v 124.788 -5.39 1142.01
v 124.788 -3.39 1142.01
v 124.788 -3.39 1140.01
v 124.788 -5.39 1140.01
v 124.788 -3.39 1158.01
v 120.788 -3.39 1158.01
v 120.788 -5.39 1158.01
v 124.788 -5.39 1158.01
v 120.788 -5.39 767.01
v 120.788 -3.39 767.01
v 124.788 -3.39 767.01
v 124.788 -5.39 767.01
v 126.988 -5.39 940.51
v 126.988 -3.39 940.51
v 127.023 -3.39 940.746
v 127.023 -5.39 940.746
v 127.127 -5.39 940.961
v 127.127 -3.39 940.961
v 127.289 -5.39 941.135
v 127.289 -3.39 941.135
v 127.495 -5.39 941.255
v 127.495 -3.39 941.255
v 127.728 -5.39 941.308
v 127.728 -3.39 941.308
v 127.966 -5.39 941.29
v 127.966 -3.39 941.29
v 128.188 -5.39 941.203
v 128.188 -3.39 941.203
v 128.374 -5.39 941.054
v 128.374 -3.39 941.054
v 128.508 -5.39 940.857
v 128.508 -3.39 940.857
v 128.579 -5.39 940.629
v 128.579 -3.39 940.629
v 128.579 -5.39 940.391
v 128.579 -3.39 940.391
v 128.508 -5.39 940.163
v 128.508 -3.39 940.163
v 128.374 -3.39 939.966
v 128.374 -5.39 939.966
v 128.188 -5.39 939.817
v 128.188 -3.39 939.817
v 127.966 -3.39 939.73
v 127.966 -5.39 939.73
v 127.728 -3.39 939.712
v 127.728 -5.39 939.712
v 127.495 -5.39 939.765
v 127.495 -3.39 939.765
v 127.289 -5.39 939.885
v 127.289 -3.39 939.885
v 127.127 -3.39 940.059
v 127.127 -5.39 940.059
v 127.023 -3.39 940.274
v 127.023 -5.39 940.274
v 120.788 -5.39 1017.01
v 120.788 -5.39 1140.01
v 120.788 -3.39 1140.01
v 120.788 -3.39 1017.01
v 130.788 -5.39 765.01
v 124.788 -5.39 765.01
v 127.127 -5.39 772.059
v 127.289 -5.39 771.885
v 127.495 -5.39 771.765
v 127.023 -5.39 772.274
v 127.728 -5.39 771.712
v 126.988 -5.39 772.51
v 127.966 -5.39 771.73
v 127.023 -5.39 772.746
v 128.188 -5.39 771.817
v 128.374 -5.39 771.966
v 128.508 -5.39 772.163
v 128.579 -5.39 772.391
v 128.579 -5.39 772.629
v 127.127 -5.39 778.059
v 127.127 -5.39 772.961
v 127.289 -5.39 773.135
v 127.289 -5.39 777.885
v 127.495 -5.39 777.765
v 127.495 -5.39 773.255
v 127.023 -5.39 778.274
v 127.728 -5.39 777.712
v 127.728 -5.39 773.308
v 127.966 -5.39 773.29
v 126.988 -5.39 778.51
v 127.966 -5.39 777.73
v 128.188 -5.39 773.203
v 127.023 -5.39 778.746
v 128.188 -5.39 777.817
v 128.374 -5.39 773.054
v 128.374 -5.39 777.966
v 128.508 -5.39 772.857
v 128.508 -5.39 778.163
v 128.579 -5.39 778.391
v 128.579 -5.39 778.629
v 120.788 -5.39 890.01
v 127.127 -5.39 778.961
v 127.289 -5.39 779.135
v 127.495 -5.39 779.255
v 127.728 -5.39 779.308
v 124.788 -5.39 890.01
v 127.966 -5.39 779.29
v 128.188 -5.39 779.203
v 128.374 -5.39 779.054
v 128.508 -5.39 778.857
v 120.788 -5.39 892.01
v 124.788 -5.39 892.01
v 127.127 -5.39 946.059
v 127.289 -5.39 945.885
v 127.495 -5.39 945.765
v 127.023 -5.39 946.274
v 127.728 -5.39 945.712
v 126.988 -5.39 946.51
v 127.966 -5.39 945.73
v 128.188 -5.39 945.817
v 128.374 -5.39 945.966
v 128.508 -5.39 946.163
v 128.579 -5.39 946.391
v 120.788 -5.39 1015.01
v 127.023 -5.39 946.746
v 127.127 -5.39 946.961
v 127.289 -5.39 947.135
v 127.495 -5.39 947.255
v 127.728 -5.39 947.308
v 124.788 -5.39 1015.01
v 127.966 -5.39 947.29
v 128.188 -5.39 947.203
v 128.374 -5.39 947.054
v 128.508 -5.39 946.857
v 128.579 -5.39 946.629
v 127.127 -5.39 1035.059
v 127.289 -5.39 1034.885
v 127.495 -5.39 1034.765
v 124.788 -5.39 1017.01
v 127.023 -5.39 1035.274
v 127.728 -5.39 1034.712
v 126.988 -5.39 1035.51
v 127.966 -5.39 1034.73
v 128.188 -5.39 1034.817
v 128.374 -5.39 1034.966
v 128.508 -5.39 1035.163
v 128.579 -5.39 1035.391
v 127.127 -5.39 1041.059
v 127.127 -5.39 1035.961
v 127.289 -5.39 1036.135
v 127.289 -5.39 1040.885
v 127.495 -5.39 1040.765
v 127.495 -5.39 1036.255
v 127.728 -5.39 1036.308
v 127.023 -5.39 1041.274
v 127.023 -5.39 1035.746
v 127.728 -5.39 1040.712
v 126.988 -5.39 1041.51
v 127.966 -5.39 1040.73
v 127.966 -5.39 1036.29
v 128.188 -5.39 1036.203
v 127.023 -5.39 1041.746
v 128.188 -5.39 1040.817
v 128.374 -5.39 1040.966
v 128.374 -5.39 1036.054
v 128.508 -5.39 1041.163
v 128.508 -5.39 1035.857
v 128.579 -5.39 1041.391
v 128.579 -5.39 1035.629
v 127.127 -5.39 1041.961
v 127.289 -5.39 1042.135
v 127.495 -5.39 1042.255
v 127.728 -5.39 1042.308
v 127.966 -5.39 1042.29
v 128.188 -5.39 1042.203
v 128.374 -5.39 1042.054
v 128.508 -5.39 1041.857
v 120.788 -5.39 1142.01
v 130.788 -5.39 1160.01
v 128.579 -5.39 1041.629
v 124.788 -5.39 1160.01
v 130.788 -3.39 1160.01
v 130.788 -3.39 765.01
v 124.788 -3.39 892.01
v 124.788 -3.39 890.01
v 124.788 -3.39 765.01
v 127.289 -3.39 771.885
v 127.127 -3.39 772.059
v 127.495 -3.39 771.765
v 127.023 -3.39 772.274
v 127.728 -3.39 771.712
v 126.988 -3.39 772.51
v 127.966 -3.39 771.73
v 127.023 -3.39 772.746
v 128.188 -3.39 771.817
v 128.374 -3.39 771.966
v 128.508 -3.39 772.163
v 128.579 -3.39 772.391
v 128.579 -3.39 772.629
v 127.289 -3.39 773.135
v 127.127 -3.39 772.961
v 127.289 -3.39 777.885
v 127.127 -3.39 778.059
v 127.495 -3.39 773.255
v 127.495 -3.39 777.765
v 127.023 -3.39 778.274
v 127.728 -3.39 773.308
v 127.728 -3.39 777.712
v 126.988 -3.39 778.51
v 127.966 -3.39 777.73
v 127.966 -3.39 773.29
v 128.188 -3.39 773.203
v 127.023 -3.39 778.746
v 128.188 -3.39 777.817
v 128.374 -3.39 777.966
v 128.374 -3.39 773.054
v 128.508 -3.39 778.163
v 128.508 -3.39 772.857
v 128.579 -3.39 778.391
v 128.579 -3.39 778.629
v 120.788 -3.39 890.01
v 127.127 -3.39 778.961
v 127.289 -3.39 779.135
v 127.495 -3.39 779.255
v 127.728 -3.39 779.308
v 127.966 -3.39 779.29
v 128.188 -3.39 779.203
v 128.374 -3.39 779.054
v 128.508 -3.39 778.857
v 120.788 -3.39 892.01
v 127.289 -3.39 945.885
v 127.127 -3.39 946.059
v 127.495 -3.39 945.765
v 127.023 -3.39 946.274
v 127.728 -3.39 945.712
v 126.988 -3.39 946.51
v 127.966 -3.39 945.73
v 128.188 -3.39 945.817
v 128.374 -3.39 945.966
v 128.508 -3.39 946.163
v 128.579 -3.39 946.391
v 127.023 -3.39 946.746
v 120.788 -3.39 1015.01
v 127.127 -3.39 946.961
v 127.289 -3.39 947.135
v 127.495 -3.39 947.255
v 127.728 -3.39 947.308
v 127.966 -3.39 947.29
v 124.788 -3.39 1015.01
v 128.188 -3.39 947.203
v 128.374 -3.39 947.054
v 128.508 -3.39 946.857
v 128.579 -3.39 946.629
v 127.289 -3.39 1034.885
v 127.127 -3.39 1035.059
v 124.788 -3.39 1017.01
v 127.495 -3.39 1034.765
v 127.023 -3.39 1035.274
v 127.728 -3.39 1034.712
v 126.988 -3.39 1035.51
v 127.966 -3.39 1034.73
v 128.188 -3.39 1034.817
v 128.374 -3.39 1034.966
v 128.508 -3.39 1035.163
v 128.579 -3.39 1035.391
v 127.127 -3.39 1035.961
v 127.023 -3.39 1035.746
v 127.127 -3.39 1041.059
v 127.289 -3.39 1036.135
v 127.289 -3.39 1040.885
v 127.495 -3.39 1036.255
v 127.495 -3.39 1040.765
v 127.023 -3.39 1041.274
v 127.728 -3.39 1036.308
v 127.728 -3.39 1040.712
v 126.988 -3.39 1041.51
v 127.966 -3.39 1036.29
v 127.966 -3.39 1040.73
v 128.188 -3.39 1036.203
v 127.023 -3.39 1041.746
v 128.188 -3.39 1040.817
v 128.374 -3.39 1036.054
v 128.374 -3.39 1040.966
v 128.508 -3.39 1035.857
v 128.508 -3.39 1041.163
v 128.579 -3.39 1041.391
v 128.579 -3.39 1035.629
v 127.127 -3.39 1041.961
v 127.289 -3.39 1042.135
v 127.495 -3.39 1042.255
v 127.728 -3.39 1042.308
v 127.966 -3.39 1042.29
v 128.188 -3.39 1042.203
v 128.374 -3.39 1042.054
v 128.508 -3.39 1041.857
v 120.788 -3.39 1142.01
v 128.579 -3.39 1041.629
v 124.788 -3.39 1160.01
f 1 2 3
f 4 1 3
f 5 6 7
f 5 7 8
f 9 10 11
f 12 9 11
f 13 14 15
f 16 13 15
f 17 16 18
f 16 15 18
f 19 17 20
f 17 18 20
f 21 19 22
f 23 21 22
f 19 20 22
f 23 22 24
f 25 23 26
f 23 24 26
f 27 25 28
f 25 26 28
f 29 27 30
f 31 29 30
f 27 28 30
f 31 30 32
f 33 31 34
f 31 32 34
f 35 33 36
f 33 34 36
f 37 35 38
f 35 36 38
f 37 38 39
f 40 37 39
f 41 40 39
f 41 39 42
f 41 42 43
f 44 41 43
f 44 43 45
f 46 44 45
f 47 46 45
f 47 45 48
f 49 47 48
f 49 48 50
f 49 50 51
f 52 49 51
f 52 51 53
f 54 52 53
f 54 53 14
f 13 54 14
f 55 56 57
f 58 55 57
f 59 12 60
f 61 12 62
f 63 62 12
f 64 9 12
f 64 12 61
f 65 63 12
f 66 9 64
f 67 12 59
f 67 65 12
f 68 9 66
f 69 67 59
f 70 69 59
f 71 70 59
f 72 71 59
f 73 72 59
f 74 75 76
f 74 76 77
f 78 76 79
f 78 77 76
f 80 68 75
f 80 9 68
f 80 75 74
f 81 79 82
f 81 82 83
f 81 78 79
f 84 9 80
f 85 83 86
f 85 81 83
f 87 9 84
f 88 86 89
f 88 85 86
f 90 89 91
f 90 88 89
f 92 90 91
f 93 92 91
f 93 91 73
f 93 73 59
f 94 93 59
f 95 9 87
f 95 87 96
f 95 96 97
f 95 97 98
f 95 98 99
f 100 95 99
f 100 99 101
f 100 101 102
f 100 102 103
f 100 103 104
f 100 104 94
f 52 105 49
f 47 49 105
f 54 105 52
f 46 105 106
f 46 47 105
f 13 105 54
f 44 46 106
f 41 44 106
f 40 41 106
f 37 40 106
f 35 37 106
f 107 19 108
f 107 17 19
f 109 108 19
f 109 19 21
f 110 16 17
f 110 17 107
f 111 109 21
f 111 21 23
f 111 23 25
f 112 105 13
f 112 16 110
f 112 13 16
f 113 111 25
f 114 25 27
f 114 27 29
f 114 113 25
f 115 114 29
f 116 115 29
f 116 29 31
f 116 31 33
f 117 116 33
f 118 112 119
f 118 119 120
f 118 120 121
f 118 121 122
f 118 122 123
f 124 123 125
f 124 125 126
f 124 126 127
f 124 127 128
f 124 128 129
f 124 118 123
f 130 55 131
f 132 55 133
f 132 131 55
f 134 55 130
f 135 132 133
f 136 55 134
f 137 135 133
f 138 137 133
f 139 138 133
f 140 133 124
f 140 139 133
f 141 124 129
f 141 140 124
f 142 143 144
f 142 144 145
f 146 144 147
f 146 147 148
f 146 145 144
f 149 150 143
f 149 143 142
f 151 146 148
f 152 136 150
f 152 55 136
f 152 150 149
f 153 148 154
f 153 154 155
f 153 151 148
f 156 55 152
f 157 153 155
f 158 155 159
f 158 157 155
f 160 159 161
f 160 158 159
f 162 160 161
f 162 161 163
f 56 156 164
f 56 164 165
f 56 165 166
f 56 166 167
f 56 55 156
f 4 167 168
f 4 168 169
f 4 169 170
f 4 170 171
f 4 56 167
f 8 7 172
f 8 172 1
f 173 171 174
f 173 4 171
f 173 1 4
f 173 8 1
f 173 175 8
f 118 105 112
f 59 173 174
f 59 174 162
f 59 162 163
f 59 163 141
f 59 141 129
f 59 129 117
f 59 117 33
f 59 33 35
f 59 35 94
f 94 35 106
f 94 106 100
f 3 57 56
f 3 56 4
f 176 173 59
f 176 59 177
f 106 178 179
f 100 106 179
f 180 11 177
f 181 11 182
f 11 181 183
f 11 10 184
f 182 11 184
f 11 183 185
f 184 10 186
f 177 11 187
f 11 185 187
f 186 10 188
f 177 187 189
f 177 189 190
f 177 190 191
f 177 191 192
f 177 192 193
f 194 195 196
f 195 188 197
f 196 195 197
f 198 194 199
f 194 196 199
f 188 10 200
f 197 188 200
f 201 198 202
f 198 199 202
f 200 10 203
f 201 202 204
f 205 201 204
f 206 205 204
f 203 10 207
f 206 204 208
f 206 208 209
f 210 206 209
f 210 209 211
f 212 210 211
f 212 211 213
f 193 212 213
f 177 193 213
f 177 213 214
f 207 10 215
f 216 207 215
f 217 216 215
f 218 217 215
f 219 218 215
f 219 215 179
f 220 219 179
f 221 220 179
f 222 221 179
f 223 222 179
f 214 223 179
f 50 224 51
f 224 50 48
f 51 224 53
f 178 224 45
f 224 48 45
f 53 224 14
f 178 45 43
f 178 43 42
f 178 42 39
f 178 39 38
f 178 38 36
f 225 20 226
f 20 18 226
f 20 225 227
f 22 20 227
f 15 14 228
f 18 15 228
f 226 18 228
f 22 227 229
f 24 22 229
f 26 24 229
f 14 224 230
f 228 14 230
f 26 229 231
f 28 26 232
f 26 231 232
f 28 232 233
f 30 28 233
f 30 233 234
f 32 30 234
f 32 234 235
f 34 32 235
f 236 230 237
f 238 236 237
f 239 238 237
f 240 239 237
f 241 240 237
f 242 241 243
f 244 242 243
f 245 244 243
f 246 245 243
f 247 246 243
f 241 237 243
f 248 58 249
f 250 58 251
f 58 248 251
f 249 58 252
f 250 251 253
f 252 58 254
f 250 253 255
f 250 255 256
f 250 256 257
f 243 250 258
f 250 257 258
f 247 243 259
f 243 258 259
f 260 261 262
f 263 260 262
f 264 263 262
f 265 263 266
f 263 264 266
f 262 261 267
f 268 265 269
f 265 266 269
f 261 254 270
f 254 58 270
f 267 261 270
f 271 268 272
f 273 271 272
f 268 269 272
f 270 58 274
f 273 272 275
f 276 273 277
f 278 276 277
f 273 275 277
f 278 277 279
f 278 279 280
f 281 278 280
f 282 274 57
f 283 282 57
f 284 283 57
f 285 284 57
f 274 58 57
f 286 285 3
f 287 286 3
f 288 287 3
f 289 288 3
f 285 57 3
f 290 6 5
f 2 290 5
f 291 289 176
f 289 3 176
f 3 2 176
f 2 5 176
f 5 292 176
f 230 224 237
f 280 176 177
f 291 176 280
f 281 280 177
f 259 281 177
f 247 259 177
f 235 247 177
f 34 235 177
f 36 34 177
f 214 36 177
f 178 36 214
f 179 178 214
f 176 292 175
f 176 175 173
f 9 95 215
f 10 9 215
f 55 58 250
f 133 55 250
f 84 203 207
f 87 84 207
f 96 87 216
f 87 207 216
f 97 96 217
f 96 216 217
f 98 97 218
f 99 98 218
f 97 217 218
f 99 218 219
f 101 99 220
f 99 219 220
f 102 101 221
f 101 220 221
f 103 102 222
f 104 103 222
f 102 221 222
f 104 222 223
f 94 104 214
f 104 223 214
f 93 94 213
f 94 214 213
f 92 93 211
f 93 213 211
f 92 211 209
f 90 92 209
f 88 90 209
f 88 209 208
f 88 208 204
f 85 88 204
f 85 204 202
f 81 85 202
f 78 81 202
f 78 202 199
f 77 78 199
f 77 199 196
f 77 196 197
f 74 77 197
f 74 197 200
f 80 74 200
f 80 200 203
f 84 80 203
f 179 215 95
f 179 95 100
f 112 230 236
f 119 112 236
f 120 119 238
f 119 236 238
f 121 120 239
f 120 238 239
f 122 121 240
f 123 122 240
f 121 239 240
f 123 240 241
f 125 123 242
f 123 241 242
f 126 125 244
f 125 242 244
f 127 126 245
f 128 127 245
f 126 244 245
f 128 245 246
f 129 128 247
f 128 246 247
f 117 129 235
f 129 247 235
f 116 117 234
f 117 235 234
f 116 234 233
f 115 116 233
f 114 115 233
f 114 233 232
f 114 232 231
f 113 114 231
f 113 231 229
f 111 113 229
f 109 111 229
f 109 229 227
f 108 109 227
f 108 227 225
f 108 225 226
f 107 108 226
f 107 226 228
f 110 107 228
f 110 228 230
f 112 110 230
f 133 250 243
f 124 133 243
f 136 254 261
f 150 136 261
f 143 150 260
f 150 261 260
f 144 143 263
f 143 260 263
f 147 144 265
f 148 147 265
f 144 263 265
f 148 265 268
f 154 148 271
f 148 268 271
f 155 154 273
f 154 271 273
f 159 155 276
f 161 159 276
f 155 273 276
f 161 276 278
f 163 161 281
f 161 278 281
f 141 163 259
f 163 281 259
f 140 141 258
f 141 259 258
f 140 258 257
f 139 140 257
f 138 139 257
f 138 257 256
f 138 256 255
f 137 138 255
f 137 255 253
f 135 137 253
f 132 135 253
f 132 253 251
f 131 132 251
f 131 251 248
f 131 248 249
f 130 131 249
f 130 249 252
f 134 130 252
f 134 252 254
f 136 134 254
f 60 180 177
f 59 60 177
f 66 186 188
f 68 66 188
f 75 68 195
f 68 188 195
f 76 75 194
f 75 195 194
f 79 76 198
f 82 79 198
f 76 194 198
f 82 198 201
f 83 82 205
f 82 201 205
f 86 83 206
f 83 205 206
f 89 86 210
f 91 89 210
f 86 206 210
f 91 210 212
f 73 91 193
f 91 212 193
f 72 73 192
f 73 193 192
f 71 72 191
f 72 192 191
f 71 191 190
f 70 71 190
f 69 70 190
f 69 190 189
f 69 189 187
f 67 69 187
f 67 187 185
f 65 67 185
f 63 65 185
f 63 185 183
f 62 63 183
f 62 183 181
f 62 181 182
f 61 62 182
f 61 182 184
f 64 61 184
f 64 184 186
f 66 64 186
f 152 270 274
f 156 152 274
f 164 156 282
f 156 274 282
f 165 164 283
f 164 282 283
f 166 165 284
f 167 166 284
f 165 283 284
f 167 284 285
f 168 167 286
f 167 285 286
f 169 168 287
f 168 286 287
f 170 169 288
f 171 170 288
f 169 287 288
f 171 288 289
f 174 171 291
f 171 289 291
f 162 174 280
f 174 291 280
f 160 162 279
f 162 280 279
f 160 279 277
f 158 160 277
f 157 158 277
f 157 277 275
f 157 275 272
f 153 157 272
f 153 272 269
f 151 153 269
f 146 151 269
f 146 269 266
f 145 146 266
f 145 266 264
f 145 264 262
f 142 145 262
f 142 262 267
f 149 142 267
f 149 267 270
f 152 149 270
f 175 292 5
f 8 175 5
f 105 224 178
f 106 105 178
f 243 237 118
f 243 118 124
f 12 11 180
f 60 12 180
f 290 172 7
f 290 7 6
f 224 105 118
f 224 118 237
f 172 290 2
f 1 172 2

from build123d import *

# Parameters (mm, degrees)
SKETCH_1_W          = 10
SKETCH_1_H          = 2
EXTRUDE_1_DEPTH     = 395
SKETCH_2_R          = 0.8
SKETCH_2_W          = 4
SKETCH_2_H          = 2
CUT_EXTRUDE_1_DEPTH = 1168.361381654


with BuildPart() as part:
    # 草图1 → 凸台-拉伸1 (new body)
    with BuildSketch(Plane.XY.offset(1160.01)):
        with Locations((125.787596038, -4.389694097)):
            Rectangle(SKETCH_1_W, SKETCH_1_H)
    extrude(amount=-EXTRUDE_1_DEPTH)

    # 草图2 → 切除-拉伸1 (cut, through all)
    with BuildSketch(Plane(origin=(0, -3.389694097, 0), x_dir=(1, 0, 0), z_dir=(0, 1, 0))):
        with Locations(Location((127.787596038, -772.51, 0), (0, 0, 180))):
            Circle(SKETCH_2_R)
        with Locations(Location((127.787596038, -778.51, 0), (0, 0, 180))):
            Circle(SKETCH_2_R)
        with Locations(Location((127.787596038, -940.51, 0), (0, 0, 180))):
            Circle(SKETCH_2_R)
        with Locations(Location((127.787596038, -946.51, 0), (0, 0, 180))):
            Circle(SKETCH_2_R)
        with Locations(Location((127.787596038, -1041.51, 0), (0, 0, 180))):
            Circle(SKETCH_2_R)
        with Locations(Location((127.787596038, -1035.51, 0), (0, 0, 180))):
            Circle(SKETCH_2_R)
        with Locations((122.787596038, -891.01)):
            Rectangle(SKETCH_2_W, SKETCH_2_H)
        with Locations((122.787596038, -766.01)):
            Rectangle(SKETCH_2_W, SKETCH_2_H)
        with Locations((122.787596038, -1016.01)):
            Rectangle(SKETCH_2_W, SKETCH_2_H)
        with Locations((122.787596038, -1141.01)):
            Rectangle(SKETCH_2_W, SKETCH_2_H)
        with Locations((122.787596038, -1159.01)):
            Rectangle(SKETCH_2_W, SKETCH_2_H)
    extrude(amount=-CUT_EXTRUDE_1_DEPTH, mode=Mode.SUBTRACT)


solid = part.part
